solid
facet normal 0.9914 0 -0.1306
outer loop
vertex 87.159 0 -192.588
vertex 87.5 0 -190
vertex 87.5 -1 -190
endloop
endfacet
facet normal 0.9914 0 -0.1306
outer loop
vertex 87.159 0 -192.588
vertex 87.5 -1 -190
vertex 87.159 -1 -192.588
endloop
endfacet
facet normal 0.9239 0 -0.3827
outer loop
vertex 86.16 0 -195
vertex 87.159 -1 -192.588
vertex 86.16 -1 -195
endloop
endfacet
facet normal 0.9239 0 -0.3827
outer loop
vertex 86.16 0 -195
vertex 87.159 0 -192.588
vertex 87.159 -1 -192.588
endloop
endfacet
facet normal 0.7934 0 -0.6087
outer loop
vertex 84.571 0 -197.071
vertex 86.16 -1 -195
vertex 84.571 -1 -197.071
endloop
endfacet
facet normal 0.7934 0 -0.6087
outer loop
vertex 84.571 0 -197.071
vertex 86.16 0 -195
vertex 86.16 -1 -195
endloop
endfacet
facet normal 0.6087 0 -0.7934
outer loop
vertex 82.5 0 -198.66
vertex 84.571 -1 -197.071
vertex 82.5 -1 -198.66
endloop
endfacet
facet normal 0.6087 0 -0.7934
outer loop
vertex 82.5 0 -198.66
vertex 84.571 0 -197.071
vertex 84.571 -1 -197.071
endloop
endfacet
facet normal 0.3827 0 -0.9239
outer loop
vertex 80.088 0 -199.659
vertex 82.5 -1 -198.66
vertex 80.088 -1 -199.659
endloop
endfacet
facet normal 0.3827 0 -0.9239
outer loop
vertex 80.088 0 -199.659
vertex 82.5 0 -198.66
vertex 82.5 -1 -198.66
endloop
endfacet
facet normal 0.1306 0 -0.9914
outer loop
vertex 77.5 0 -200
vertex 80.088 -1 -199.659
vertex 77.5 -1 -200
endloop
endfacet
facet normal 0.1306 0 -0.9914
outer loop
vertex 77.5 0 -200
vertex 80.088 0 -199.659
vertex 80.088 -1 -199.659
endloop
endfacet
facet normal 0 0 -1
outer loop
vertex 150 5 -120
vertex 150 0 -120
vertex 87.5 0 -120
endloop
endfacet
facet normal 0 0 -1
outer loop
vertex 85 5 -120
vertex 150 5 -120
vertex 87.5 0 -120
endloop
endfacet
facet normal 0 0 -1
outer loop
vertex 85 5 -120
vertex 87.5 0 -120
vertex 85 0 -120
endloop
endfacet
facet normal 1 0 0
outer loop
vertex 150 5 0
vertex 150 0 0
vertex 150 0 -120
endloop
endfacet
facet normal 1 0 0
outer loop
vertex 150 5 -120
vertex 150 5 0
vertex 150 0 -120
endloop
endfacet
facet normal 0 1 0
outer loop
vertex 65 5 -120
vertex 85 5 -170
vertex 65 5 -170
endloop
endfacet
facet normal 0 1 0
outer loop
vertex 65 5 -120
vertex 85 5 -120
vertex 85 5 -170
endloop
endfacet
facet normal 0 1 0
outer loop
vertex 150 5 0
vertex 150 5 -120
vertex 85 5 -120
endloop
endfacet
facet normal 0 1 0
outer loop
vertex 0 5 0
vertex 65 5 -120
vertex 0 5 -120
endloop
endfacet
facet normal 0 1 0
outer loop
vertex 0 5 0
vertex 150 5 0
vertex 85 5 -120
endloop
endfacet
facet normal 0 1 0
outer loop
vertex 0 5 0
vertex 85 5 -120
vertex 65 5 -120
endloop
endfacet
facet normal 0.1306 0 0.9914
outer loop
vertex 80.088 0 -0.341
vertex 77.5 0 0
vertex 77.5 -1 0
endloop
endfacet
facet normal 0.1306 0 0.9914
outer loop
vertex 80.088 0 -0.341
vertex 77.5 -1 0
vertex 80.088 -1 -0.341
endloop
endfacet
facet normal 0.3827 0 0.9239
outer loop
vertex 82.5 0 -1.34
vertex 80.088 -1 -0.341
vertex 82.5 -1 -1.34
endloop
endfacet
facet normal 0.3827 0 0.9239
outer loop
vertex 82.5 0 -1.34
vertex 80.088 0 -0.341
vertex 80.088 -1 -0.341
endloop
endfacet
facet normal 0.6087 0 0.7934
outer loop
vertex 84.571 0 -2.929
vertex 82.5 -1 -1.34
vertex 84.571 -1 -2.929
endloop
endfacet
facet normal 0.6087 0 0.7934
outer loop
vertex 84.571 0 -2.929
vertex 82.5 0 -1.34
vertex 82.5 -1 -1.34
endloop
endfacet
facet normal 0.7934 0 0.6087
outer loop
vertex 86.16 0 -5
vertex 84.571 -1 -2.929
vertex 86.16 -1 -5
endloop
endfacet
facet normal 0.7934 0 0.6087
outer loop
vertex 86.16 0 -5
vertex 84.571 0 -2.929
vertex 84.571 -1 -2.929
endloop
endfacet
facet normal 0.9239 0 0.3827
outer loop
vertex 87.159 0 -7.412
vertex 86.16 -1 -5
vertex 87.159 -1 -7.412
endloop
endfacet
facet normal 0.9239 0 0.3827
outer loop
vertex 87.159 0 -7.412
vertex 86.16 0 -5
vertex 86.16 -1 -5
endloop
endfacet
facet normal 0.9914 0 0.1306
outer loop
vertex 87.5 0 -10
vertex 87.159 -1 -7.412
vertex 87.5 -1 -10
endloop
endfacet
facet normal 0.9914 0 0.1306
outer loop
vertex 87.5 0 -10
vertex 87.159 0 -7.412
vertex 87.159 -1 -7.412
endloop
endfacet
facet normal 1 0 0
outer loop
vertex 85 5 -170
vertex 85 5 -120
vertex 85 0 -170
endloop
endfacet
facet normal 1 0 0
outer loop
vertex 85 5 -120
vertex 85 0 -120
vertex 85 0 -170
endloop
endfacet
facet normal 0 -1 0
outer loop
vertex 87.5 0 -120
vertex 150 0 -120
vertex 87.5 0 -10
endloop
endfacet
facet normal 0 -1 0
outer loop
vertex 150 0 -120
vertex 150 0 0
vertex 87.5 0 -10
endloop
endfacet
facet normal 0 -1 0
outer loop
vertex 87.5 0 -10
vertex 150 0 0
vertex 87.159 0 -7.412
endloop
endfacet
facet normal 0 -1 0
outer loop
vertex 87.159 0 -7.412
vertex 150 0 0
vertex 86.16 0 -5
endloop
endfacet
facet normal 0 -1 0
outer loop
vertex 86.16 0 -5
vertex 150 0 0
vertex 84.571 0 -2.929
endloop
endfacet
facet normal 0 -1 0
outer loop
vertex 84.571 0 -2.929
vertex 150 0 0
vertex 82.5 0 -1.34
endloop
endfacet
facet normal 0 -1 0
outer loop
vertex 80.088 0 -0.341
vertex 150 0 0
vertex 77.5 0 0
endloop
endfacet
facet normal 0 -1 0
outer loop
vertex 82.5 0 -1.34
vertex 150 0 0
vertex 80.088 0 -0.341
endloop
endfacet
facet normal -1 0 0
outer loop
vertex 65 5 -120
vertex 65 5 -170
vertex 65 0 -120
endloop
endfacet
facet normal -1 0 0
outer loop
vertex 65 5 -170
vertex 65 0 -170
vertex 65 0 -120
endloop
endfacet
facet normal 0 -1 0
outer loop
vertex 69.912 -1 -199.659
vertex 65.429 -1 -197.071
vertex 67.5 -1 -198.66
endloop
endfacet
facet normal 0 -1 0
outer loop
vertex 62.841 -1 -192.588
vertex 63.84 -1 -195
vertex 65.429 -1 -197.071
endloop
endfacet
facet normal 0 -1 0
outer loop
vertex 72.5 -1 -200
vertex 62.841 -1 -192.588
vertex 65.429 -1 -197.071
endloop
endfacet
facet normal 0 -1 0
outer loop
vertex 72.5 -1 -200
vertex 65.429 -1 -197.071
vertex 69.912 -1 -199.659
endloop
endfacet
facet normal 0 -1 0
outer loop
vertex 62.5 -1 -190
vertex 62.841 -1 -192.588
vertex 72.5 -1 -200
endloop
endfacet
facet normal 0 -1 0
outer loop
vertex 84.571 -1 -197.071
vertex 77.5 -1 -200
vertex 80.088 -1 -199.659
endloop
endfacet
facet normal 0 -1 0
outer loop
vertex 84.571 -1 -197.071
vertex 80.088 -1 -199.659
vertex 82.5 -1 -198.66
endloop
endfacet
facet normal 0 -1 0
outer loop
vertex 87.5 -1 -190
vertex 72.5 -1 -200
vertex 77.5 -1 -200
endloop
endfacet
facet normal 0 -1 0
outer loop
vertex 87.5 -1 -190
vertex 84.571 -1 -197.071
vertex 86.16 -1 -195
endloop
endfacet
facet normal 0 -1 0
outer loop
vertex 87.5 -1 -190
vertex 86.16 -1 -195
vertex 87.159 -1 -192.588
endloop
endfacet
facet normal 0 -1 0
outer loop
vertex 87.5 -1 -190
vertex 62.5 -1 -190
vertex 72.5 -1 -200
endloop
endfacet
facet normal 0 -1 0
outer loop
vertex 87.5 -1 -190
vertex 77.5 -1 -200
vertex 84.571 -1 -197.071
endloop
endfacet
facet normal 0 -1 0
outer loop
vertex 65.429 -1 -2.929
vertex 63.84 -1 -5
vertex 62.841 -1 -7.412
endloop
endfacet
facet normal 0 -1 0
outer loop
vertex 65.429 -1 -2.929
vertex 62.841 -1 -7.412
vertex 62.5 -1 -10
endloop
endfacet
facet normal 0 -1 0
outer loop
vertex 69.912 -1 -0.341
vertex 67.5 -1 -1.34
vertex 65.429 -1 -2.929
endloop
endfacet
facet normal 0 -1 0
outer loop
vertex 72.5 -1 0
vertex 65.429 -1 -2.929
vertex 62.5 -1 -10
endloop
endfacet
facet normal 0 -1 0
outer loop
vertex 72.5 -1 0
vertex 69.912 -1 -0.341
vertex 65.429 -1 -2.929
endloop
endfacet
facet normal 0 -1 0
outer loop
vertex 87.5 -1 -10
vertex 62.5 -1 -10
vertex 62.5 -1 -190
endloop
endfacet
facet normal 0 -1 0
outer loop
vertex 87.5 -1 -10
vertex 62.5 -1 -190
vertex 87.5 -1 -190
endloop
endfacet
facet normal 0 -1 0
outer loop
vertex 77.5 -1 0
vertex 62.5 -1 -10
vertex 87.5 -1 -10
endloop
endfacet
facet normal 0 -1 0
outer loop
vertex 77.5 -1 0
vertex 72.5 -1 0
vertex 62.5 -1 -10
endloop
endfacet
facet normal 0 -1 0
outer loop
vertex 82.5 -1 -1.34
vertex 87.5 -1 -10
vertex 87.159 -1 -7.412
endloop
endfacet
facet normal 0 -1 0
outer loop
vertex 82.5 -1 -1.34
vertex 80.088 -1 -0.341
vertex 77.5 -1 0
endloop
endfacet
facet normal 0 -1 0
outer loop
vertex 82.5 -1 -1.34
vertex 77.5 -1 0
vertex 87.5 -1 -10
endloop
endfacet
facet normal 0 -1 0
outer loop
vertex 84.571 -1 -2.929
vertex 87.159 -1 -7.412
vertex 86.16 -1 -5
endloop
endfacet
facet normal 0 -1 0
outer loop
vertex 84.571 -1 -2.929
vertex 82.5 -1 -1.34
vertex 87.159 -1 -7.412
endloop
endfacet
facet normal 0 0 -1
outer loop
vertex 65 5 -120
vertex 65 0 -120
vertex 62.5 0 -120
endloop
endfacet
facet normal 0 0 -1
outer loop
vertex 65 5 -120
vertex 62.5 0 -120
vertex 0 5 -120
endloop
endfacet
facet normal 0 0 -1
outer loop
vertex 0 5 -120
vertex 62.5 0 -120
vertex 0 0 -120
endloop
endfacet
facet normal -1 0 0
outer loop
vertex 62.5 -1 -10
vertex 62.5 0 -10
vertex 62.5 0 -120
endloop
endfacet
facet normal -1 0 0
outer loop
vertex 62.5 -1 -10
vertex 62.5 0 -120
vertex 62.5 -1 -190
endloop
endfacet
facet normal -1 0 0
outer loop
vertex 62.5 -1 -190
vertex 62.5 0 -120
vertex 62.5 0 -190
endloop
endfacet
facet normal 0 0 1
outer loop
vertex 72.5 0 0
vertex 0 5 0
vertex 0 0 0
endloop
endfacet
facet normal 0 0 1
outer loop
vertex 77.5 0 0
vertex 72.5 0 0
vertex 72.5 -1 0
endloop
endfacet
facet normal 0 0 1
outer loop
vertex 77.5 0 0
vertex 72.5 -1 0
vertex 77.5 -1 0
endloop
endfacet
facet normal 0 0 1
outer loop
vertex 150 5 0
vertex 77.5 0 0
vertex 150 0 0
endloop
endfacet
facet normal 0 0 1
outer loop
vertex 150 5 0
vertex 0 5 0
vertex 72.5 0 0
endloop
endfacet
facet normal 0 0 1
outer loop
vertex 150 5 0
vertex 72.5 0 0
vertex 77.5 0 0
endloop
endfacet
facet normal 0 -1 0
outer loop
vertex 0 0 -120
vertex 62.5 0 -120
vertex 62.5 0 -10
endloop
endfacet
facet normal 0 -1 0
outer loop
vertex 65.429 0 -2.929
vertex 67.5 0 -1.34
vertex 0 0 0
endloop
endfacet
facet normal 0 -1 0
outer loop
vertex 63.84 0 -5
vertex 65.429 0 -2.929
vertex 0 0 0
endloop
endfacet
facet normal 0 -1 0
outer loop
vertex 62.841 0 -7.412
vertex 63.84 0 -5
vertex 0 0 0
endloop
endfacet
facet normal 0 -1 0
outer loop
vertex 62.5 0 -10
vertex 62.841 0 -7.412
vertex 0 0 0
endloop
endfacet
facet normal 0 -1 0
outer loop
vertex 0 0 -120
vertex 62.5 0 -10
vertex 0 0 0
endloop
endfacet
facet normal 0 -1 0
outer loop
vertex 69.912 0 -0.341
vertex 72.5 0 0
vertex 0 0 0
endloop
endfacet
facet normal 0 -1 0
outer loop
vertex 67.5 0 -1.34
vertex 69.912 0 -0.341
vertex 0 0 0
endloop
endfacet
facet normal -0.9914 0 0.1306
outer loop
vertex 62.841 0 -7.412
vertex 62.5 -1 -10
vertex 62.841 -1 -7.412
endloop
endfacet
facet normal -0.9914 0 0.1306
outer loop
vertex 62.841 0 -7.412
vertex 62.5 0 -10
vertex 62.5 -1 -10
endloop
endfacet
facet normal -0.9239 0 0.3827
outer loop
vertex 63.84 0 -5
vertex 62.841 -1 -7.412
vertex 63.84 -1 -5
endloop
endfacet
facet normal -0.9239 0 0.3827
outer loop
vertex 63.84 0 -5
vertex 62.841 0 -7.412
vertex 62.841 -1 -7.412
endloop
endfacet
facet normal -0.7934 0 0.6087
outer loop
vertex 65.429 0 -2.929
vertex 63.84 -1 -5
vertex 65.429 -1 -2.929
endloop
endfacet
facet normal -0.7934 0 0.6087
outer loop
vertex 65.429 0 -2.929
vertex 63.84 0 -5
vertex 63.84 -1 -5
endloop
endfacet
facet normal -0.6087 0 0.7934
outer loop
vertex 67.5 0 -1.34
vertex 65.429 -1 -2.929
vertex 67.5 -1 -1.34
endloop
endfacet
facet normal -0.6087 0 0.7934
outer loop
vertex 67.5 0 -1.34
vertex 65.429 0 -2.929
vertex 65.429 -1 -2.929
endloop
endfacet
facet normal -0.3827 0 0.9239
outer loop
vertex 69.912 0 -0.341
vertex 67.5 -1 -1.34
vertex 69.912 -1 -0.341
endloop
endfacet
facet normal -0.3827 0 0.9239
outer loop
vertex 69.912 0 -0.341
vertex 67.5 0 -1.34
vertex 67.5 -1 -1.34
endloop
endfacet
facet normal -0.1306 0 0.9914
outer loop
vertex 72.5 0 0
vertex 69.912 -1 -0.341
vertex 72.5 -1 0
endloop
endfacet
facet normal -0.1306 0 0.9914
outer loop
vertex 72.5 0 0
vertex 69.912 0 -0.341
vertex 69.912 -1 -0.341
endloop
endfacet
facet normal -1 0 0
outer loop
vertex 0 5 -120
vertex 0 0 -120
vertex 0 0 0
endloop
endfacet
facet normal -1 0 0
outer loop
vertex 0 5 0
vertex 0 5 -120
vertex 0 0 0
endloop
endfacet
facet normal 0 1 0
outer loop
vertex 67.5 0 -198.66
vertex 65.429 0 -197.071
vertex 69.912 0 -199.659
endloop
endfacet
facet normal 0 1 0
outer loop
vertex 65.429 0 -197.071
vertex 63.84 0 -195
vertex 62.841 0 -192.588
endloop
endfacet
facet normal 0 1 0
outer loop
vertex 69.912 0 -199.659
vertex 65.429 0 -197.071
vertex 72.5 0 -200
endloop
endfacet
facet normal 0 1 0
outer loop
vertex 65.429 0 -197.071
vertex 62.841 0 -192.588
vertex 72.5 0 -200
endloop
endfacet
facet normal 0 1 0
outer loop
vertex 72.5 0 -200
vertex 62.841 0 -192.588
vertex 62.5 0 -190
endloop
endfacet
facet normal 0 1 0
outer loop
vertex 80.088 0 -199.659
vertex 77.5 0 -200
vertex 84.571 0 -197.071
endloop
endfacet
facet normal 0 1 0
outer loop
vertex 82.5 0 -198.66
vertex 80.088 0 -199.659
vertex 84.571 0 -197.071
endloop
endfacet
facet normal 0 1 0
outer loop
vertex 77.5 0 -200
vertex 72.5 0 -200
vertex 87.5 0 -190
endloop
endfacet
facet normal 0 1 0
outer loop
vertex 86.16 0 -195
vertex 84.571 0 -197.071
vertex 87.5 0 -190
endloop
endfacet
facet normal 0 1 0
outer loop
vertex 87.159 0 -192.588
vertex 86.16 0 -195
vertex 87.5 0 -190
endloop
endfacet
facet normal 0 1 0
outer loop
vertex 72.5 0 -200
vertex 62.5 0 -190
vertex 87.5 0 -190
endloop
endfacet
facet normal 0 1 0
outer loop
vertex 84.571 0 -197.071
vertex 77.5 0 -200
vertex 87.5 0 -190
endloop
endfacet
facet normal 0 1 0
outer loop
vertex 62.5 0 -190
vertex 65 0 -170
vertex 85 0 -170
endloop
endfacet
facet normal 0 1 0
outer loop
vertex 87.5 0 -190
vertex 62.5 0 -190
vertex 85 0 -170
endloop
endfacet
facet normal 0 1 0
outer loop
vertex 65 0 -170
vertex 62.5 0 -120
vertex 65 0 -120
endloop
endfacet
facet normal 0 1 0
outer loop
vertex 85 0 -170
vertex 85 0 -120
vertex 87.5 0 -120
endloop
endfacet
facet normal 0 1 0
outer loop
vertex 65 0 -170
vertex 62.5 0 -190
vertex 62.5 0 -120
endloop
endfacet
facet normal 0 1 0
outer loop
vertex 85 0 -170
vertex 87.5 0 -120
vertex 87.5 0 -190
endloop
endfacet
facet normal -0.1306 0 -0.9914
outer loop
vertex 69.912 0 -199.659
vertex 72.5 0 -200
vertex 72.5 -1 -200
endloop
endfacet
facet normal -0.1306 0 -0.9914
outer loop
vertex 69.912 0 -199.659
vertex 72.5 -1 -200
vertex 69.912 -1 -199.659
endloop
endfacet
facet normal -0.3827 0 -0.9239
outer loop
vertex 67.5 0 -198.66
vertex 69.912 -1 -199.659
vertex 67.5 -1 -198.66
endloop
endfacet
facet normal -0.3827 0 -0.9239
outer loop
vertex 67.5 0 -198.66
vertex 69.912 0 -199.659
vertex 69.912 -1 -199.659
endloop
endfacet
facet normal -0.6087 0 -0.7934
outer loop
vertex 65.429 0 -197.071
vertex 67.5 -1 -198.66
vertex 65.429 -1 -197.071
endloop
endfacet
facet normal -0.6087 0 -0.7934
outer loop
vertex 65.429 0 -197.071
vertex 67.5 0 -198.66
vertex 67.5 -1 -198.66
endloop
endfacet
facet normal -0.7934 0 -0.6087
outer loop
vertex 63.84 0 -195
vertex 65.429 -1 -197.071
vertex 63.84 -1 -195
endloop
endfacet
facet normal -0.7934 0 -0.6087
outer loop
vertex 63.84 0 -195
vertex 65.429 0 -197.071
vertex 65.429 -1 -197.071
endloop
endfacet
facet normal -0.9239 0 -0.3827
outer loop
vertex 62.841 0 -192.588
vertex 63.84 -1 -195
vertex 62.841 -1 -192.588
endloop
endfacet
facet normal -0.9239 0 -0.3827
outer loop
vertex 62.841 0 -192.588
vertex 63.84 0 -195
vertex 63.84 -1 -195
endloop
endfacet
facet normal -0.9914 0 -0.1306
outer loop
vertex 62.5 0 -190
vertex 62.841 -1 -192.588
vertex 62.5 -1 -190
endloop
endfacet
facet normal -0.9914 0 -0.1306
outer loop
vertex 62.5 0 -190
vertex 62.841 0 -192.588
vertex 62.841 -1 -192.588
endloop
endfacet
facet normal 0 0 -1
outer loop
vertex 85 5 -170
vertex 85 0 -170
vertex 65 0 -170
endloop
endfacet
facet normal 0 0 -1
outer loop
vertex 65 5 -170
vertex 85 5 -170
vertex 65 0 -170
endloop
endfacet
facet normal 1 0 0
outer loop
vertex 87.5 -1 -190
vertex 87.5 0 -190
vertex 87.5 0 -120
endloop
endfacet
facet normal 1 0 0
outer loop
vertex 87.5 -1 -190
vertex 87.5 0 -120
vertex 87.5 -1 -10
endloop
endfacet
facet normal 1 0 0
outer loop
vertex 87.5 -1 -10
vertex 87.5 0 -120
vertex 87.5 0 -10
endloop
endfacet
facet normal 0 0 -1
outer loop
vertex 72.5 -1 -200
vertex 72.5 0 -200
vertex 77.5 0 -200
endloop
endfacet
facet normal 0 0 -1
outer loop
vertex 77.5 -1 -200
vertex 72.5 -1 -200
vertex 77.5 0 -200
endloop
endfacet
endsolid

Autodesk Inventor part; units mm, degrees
ref_plane "YZ Plane" through (0, 0, 0) normal (1, 0, 0) x (0, 1, 0)
ref_plane "XZ Plane" through (0, 0, 0) normal (0, 1, 0) x (-1, 0, 0)
ref_plane "XY Plane" through (0, 0, 0) normal (0, 0, 1) x (1, 0, 0)
sketch "Sketch1" plane through (0, 0, 0) normal (0, 1, 0) x (-1, 0, 0)
  line L0 (0, 0) -> (-150, 0)
  line L1 (-150, 0) -> (-150, -120)
  line L2 (0, -120) -> (0, 0)
  line L3 (-65, -120) -> (-85, -120)
  line L4 (-85, -120) -> (-85, -170)
  line L5 (-85, -170) -> (-65, -170)
  line L6 (-65, -170) -> (-65, -120)
  line L7 (-150, -120) -> (-85, -120)
  line L8 (-65, -120) -> (0, -120)
  dimension "d0" = 150
  dimension "d1" = 120
  dimension "d2" = 20
  dimension "d3" = 50
extrude "Extrusion1" add sketch "Sketch1" along normal blind 5
sketch "Sketch2" plane through (0, 0, 0) normal (0, -1, 0) x (1, 0, 0)
  line L0 (0, 0) -> (150, 0) projected
  line L1 (77.5, 0) -> (72.5, 0)
  line L2 (62.5, -10) -> (62.5, -190)
  line L3 (72.5, -200) -> (77.5, -200)
  line L4 (87.5, -190) -> (87.5, -10)
  arc A0 (62.5, -190) -> (72.5, -200) centre (72.5, -190) ccw
  arc A1 (77.5, -200) -> (87.5, -190) centre (77.5, -190) ccw
  arc A2 (72.5, 0) -> (62.5, -10) centre (72.5, -10) ccw
  arc A3 (87.5, -10) -> (77.5, 0) centre (77.5, -10) ccw
  point P0 (87.5, 0)
  point P1 (62.5, -200)
  point P2 (62.5, 0)
  point P3 (87.5, -200)
  dimension "d6" = 25
  dimension "d7" = 200
  dimension "d8" = 10
extrude "Extrusion2" add sketch "Sketch2" along normal blind 1
properties part number "base"
